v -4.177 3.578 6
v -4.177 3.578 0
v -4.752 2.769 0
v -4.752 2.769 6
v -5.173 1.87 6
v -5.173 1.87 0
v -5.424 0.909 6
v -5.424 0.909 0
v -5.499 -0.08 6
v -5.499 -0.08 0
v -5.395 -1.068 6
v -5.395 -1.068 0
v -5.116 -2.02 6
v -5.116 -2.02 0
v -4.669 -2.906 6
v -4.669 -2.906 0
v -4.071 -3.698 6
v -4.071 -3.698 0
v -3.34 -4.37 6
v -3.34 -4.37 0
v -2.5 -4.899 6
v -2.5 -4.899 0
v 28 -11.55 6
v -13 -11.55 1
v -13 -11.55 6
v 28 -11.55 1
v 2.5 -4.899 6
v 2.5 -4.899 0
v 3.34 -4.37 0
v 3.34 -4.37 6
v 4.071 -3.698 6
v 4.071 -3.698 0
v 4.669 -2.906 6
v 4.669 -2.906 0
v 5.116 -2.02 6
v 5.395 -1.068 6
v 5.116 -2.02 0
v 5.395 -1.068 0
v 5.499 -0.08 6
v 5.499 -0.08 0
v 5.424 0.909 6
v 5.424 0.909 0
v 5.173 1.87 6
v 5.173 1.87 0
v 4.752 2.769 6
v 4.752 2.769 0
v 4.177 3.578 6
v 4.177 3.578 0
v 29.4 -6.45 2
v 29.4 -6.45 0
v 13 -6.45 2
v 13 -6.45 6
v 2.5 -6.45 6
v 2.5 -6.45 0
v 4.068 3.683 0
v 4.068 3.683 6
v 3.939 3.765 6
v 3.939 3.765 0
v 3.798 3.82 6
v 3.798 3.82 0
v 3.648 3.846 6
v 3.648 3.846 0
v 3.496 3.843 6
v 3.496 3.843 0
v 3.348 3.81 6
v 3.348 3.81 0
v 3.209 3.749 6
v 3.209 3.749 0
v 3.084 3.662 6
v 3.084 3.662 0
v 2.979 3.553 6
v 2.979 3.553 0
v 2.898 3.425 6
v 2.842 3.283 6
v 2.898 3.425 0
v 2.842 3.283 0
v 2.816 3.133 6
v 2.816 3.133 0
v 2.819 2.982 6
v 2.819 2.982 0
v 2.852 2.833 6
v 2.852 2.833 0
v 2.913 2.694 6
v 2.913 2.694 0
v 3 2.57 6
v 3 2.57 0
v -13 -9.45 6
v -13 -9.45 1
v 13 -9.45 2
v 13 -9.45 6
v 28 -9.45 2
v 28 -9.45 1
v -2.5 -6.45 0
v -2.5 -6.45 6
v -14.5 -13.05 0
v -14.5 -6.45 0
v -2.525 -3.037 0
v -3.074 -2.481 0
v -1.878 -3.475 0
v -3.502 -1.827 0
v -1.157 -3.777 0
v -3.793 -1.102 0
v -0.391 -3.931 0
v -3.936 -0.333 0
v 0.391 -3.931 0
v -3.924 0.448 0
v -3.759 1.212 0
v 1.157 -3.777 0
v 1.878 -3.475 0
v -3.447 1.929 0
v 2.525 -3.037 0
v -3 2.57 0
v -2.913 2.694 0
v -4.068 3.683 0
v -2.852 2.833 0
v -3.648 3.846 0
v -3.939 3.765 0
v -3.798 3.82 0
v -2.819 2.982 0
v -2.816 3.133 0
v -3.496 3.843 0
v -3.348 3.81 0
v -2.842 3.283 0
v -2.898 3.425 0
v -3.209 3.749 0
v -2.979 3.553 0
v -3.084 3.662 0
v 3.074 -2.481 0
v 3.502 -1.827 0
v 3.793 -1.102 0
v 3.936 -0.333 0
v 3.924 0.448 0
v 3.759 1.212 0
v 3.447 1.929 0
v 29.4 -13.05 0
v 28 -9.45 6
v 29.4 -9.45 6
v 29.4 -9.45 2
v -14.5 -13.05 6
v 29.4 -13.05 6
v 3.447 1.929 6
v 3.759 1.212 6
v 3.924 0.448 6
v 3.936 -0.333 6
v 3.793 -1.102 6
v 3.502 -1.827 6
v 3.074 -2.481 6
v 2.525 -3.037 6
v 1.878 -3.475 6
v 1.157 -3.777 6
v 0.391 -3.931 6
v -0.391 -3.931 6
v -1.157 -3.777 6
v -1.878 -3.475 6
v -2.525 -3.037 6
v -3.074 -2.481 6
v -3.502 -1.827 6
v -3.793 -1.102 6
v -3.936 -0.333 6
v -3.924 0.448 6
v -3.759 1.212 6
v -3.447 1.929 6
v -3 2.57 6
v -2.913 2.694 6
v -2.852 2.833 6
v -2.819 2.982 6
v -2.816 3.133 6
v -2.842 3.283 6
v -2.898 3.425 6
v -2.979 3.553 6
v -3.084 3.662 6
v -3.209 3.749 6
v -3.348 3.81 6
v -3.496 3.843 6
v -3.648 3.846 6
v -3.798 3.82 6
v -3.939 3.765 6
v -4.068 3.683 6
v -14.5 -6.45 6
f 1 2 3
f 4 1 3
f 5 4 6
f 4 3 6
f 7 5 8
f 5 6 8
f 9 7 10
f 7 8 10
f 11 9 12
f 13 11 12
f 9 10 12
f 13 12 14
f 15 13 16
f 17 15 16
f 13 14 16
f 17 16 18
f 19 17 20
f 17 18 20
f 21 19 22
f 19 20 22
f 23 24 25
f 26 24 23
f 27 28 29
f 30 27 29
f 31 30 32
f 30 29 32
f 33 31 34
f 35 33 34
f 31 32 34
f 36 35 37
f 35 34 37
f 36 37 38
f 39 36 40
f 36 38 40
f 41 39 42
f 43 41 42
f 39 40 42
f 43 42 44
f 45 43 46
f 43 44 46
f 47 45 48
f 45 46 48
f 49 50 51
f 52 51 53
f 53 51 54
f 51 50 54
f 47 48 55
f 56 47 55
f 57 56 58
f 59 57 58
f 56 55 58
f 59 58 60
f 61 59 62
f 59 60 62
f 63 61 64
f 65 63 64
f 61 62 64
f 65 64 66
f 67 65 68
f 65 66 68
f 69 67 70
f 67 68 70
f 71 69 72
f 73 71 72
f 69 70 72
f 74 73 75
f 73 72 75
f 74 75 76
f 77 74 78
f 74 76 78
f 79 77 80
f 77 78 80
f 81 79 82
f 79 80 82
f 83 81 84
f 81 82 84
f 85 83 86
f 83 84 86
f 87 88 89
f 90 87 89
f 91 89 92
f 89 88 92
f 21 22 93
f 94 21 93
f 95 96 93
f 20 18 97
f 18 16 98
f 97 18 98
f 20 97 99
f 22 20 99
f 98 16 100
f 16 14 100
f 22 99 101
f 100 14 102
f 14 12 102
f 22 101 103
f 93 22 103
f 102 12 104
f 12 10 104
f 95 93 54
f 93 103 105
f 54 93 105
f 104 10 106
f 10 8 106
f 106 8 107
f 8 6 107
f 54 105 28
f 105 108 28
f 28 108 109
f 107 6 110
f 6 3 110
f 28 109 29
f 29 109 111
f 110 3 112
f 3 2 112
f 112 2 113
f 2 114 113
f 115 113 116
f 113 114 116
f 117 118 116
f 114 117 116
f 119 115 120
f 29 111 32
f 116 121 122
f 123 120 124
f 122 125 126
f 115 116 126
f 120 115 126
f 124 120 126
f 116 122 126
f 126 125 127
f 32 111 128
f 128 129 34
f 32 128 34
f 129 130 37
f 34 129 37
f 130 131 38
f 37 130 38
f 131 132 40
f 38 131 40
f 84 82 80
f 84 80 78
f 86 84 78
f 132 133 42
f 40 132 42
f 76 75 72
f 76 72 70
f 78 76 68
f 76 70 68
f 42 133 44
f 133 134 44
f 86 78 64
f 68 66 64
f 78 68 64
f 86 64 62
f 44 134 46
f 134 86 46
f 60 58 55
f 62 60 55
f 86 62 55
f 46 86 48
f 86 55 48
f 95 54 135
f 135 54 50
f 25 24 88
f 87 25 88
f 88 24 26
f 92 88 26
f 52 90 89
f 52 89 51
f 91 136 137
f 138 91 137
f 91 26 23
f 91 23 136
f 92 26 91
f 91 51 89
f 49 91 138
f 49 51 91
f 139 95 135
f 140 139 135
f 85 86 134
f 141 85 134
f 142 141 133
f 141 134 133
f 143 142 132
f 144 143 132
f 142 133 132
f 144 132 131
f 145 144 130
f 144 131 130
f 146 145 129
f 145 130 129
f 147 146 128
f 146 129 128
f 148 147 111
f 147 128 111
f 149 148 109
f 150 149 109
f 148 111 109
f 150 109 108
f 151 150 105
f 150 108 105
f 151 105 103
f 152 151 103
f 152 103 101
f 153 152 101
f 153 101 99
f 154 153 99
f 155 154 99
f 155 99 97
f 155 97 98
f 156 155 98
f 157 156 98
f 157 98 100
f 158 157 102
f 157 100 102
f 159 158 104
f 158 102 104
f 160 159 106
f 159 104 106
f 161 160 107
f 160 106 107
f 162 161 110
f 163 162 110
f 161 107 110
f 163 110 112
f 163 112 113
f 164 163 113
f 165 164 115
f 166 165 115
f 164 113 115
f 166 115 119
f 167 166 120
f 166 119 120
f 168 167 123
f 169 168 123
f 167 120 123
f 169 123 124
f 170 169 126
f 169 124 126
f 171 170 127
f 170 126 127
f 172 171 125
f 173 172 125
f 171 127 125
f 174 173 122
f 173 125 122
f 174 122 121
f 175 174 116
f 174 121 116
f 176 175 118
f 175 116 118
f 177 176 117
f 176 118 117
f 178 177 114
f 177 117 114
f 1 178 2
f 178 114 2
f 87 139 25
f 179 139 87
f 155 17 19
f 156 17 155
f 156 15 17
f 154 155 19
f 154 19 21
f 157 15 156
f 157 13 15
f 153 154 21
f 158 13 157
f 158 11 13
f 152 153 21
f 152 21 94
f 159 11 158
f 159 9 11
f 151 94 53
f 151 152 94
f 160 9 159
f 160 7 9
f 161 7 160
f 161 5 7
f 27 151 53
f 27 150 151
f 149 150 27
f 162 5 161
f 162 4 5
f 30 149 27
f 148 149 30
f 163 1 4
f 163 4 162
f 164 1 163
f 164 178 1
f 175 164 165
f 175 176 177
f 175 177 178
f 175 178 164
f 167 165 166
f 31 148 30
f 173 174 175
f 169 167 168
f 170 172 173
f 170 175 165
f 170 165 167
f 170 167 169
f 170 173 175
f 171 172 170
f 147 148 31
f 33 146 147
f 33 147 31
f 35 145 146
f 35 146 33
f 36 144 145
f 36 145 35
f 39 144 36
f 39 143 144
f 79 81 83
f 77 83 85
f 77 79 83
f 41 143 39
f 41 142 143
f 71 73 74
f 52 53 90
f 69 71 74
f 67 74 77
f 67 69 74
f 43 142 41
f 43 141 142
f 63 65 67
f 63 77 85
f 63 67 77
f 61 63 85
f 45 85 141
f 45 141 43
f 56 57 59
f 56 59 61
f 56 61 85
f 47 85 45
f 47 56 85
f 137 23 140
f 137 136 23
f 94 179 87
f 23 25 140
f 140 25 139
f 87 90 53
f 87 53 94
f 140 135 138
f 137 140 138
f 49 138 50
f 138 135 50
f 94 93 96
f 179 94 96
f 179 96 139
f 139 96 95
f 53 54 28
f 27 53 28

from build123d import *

# Parameters (mm, degrees)
F0_W     = 41
F0_H     = 2.1
F1_DEPTH = 6
F2_W     = 16.4
F2_H     = 3
F3_DEPTH = 4
F4_W     = 43.9
F4_H     = 6.6
F5_DEPTH = 1


with BuildPart() as f1:
    # F0 (on Top) → F1 (new body)
    with BuildSketch(Plane.XY):
        with BuildLine():
            ThreePointArc((3, 2.569533), (0, -3.95), (-3, 2.569533))
            ThreePointArc((-3, 2.569533), (-3.084459, 3.66229), (-4.177215, 3.577831))
            ThreePointArc((-4.177215, 3.577831), (-5.395403, -1.06753), (-2.5, -4.898979))
            Line((-2.5, -4.898979), (-2.5, -6.45))
            Line((-2.5, -6.45), (-14.5, -6.45))
            Line((-14.5, -6.45), (-14.5, -13.05))
            Line((-14.5, -13.05), (29.4, -13.05))
            Line((29.4, -13.05), (29.4, -6.45))
            Line((29.4, -6.45), (2.5, -6.45))
            Line((2.5, -6.45), (2.5, -4.898979))
            ThreePointArc((2.5, -4.898979), (5.395403, -1.06753), (4.177215, 3.577831))
            ThreePointArc((4.177215, 3.577831), (3.084459, 3.66229), (3, 2.569533))
        make_face()
        with Locations((7.5, -10.5)):
            Rectangle(F0_W, F0_H, mode=Mode.SUBTRACT)
    extrude(amount=F1_DEPTH)

    # F2 (on face) → F3 (cut)
    with BuildSketch(Plane.XY.offset(6)):
        with Locations((21.2, -7.95)):
            Rectangle(F2_W, F2_H)
    extrude(amount=-F3_DEPTH, mode=Mode.SUBTRACT)

    # F4 (on face) → F5 (join)
    with BuildSketch(Plane(origin=(0, 0, 0), x_dir=(1, 0, 0), z_dir=(0, 0, -1))):
        with Locations((7.45, 9.75)):
            Rectangle(F4_W, F4_H)
    extrude(amount=-F5_DEPTH)


solid = f1.part
